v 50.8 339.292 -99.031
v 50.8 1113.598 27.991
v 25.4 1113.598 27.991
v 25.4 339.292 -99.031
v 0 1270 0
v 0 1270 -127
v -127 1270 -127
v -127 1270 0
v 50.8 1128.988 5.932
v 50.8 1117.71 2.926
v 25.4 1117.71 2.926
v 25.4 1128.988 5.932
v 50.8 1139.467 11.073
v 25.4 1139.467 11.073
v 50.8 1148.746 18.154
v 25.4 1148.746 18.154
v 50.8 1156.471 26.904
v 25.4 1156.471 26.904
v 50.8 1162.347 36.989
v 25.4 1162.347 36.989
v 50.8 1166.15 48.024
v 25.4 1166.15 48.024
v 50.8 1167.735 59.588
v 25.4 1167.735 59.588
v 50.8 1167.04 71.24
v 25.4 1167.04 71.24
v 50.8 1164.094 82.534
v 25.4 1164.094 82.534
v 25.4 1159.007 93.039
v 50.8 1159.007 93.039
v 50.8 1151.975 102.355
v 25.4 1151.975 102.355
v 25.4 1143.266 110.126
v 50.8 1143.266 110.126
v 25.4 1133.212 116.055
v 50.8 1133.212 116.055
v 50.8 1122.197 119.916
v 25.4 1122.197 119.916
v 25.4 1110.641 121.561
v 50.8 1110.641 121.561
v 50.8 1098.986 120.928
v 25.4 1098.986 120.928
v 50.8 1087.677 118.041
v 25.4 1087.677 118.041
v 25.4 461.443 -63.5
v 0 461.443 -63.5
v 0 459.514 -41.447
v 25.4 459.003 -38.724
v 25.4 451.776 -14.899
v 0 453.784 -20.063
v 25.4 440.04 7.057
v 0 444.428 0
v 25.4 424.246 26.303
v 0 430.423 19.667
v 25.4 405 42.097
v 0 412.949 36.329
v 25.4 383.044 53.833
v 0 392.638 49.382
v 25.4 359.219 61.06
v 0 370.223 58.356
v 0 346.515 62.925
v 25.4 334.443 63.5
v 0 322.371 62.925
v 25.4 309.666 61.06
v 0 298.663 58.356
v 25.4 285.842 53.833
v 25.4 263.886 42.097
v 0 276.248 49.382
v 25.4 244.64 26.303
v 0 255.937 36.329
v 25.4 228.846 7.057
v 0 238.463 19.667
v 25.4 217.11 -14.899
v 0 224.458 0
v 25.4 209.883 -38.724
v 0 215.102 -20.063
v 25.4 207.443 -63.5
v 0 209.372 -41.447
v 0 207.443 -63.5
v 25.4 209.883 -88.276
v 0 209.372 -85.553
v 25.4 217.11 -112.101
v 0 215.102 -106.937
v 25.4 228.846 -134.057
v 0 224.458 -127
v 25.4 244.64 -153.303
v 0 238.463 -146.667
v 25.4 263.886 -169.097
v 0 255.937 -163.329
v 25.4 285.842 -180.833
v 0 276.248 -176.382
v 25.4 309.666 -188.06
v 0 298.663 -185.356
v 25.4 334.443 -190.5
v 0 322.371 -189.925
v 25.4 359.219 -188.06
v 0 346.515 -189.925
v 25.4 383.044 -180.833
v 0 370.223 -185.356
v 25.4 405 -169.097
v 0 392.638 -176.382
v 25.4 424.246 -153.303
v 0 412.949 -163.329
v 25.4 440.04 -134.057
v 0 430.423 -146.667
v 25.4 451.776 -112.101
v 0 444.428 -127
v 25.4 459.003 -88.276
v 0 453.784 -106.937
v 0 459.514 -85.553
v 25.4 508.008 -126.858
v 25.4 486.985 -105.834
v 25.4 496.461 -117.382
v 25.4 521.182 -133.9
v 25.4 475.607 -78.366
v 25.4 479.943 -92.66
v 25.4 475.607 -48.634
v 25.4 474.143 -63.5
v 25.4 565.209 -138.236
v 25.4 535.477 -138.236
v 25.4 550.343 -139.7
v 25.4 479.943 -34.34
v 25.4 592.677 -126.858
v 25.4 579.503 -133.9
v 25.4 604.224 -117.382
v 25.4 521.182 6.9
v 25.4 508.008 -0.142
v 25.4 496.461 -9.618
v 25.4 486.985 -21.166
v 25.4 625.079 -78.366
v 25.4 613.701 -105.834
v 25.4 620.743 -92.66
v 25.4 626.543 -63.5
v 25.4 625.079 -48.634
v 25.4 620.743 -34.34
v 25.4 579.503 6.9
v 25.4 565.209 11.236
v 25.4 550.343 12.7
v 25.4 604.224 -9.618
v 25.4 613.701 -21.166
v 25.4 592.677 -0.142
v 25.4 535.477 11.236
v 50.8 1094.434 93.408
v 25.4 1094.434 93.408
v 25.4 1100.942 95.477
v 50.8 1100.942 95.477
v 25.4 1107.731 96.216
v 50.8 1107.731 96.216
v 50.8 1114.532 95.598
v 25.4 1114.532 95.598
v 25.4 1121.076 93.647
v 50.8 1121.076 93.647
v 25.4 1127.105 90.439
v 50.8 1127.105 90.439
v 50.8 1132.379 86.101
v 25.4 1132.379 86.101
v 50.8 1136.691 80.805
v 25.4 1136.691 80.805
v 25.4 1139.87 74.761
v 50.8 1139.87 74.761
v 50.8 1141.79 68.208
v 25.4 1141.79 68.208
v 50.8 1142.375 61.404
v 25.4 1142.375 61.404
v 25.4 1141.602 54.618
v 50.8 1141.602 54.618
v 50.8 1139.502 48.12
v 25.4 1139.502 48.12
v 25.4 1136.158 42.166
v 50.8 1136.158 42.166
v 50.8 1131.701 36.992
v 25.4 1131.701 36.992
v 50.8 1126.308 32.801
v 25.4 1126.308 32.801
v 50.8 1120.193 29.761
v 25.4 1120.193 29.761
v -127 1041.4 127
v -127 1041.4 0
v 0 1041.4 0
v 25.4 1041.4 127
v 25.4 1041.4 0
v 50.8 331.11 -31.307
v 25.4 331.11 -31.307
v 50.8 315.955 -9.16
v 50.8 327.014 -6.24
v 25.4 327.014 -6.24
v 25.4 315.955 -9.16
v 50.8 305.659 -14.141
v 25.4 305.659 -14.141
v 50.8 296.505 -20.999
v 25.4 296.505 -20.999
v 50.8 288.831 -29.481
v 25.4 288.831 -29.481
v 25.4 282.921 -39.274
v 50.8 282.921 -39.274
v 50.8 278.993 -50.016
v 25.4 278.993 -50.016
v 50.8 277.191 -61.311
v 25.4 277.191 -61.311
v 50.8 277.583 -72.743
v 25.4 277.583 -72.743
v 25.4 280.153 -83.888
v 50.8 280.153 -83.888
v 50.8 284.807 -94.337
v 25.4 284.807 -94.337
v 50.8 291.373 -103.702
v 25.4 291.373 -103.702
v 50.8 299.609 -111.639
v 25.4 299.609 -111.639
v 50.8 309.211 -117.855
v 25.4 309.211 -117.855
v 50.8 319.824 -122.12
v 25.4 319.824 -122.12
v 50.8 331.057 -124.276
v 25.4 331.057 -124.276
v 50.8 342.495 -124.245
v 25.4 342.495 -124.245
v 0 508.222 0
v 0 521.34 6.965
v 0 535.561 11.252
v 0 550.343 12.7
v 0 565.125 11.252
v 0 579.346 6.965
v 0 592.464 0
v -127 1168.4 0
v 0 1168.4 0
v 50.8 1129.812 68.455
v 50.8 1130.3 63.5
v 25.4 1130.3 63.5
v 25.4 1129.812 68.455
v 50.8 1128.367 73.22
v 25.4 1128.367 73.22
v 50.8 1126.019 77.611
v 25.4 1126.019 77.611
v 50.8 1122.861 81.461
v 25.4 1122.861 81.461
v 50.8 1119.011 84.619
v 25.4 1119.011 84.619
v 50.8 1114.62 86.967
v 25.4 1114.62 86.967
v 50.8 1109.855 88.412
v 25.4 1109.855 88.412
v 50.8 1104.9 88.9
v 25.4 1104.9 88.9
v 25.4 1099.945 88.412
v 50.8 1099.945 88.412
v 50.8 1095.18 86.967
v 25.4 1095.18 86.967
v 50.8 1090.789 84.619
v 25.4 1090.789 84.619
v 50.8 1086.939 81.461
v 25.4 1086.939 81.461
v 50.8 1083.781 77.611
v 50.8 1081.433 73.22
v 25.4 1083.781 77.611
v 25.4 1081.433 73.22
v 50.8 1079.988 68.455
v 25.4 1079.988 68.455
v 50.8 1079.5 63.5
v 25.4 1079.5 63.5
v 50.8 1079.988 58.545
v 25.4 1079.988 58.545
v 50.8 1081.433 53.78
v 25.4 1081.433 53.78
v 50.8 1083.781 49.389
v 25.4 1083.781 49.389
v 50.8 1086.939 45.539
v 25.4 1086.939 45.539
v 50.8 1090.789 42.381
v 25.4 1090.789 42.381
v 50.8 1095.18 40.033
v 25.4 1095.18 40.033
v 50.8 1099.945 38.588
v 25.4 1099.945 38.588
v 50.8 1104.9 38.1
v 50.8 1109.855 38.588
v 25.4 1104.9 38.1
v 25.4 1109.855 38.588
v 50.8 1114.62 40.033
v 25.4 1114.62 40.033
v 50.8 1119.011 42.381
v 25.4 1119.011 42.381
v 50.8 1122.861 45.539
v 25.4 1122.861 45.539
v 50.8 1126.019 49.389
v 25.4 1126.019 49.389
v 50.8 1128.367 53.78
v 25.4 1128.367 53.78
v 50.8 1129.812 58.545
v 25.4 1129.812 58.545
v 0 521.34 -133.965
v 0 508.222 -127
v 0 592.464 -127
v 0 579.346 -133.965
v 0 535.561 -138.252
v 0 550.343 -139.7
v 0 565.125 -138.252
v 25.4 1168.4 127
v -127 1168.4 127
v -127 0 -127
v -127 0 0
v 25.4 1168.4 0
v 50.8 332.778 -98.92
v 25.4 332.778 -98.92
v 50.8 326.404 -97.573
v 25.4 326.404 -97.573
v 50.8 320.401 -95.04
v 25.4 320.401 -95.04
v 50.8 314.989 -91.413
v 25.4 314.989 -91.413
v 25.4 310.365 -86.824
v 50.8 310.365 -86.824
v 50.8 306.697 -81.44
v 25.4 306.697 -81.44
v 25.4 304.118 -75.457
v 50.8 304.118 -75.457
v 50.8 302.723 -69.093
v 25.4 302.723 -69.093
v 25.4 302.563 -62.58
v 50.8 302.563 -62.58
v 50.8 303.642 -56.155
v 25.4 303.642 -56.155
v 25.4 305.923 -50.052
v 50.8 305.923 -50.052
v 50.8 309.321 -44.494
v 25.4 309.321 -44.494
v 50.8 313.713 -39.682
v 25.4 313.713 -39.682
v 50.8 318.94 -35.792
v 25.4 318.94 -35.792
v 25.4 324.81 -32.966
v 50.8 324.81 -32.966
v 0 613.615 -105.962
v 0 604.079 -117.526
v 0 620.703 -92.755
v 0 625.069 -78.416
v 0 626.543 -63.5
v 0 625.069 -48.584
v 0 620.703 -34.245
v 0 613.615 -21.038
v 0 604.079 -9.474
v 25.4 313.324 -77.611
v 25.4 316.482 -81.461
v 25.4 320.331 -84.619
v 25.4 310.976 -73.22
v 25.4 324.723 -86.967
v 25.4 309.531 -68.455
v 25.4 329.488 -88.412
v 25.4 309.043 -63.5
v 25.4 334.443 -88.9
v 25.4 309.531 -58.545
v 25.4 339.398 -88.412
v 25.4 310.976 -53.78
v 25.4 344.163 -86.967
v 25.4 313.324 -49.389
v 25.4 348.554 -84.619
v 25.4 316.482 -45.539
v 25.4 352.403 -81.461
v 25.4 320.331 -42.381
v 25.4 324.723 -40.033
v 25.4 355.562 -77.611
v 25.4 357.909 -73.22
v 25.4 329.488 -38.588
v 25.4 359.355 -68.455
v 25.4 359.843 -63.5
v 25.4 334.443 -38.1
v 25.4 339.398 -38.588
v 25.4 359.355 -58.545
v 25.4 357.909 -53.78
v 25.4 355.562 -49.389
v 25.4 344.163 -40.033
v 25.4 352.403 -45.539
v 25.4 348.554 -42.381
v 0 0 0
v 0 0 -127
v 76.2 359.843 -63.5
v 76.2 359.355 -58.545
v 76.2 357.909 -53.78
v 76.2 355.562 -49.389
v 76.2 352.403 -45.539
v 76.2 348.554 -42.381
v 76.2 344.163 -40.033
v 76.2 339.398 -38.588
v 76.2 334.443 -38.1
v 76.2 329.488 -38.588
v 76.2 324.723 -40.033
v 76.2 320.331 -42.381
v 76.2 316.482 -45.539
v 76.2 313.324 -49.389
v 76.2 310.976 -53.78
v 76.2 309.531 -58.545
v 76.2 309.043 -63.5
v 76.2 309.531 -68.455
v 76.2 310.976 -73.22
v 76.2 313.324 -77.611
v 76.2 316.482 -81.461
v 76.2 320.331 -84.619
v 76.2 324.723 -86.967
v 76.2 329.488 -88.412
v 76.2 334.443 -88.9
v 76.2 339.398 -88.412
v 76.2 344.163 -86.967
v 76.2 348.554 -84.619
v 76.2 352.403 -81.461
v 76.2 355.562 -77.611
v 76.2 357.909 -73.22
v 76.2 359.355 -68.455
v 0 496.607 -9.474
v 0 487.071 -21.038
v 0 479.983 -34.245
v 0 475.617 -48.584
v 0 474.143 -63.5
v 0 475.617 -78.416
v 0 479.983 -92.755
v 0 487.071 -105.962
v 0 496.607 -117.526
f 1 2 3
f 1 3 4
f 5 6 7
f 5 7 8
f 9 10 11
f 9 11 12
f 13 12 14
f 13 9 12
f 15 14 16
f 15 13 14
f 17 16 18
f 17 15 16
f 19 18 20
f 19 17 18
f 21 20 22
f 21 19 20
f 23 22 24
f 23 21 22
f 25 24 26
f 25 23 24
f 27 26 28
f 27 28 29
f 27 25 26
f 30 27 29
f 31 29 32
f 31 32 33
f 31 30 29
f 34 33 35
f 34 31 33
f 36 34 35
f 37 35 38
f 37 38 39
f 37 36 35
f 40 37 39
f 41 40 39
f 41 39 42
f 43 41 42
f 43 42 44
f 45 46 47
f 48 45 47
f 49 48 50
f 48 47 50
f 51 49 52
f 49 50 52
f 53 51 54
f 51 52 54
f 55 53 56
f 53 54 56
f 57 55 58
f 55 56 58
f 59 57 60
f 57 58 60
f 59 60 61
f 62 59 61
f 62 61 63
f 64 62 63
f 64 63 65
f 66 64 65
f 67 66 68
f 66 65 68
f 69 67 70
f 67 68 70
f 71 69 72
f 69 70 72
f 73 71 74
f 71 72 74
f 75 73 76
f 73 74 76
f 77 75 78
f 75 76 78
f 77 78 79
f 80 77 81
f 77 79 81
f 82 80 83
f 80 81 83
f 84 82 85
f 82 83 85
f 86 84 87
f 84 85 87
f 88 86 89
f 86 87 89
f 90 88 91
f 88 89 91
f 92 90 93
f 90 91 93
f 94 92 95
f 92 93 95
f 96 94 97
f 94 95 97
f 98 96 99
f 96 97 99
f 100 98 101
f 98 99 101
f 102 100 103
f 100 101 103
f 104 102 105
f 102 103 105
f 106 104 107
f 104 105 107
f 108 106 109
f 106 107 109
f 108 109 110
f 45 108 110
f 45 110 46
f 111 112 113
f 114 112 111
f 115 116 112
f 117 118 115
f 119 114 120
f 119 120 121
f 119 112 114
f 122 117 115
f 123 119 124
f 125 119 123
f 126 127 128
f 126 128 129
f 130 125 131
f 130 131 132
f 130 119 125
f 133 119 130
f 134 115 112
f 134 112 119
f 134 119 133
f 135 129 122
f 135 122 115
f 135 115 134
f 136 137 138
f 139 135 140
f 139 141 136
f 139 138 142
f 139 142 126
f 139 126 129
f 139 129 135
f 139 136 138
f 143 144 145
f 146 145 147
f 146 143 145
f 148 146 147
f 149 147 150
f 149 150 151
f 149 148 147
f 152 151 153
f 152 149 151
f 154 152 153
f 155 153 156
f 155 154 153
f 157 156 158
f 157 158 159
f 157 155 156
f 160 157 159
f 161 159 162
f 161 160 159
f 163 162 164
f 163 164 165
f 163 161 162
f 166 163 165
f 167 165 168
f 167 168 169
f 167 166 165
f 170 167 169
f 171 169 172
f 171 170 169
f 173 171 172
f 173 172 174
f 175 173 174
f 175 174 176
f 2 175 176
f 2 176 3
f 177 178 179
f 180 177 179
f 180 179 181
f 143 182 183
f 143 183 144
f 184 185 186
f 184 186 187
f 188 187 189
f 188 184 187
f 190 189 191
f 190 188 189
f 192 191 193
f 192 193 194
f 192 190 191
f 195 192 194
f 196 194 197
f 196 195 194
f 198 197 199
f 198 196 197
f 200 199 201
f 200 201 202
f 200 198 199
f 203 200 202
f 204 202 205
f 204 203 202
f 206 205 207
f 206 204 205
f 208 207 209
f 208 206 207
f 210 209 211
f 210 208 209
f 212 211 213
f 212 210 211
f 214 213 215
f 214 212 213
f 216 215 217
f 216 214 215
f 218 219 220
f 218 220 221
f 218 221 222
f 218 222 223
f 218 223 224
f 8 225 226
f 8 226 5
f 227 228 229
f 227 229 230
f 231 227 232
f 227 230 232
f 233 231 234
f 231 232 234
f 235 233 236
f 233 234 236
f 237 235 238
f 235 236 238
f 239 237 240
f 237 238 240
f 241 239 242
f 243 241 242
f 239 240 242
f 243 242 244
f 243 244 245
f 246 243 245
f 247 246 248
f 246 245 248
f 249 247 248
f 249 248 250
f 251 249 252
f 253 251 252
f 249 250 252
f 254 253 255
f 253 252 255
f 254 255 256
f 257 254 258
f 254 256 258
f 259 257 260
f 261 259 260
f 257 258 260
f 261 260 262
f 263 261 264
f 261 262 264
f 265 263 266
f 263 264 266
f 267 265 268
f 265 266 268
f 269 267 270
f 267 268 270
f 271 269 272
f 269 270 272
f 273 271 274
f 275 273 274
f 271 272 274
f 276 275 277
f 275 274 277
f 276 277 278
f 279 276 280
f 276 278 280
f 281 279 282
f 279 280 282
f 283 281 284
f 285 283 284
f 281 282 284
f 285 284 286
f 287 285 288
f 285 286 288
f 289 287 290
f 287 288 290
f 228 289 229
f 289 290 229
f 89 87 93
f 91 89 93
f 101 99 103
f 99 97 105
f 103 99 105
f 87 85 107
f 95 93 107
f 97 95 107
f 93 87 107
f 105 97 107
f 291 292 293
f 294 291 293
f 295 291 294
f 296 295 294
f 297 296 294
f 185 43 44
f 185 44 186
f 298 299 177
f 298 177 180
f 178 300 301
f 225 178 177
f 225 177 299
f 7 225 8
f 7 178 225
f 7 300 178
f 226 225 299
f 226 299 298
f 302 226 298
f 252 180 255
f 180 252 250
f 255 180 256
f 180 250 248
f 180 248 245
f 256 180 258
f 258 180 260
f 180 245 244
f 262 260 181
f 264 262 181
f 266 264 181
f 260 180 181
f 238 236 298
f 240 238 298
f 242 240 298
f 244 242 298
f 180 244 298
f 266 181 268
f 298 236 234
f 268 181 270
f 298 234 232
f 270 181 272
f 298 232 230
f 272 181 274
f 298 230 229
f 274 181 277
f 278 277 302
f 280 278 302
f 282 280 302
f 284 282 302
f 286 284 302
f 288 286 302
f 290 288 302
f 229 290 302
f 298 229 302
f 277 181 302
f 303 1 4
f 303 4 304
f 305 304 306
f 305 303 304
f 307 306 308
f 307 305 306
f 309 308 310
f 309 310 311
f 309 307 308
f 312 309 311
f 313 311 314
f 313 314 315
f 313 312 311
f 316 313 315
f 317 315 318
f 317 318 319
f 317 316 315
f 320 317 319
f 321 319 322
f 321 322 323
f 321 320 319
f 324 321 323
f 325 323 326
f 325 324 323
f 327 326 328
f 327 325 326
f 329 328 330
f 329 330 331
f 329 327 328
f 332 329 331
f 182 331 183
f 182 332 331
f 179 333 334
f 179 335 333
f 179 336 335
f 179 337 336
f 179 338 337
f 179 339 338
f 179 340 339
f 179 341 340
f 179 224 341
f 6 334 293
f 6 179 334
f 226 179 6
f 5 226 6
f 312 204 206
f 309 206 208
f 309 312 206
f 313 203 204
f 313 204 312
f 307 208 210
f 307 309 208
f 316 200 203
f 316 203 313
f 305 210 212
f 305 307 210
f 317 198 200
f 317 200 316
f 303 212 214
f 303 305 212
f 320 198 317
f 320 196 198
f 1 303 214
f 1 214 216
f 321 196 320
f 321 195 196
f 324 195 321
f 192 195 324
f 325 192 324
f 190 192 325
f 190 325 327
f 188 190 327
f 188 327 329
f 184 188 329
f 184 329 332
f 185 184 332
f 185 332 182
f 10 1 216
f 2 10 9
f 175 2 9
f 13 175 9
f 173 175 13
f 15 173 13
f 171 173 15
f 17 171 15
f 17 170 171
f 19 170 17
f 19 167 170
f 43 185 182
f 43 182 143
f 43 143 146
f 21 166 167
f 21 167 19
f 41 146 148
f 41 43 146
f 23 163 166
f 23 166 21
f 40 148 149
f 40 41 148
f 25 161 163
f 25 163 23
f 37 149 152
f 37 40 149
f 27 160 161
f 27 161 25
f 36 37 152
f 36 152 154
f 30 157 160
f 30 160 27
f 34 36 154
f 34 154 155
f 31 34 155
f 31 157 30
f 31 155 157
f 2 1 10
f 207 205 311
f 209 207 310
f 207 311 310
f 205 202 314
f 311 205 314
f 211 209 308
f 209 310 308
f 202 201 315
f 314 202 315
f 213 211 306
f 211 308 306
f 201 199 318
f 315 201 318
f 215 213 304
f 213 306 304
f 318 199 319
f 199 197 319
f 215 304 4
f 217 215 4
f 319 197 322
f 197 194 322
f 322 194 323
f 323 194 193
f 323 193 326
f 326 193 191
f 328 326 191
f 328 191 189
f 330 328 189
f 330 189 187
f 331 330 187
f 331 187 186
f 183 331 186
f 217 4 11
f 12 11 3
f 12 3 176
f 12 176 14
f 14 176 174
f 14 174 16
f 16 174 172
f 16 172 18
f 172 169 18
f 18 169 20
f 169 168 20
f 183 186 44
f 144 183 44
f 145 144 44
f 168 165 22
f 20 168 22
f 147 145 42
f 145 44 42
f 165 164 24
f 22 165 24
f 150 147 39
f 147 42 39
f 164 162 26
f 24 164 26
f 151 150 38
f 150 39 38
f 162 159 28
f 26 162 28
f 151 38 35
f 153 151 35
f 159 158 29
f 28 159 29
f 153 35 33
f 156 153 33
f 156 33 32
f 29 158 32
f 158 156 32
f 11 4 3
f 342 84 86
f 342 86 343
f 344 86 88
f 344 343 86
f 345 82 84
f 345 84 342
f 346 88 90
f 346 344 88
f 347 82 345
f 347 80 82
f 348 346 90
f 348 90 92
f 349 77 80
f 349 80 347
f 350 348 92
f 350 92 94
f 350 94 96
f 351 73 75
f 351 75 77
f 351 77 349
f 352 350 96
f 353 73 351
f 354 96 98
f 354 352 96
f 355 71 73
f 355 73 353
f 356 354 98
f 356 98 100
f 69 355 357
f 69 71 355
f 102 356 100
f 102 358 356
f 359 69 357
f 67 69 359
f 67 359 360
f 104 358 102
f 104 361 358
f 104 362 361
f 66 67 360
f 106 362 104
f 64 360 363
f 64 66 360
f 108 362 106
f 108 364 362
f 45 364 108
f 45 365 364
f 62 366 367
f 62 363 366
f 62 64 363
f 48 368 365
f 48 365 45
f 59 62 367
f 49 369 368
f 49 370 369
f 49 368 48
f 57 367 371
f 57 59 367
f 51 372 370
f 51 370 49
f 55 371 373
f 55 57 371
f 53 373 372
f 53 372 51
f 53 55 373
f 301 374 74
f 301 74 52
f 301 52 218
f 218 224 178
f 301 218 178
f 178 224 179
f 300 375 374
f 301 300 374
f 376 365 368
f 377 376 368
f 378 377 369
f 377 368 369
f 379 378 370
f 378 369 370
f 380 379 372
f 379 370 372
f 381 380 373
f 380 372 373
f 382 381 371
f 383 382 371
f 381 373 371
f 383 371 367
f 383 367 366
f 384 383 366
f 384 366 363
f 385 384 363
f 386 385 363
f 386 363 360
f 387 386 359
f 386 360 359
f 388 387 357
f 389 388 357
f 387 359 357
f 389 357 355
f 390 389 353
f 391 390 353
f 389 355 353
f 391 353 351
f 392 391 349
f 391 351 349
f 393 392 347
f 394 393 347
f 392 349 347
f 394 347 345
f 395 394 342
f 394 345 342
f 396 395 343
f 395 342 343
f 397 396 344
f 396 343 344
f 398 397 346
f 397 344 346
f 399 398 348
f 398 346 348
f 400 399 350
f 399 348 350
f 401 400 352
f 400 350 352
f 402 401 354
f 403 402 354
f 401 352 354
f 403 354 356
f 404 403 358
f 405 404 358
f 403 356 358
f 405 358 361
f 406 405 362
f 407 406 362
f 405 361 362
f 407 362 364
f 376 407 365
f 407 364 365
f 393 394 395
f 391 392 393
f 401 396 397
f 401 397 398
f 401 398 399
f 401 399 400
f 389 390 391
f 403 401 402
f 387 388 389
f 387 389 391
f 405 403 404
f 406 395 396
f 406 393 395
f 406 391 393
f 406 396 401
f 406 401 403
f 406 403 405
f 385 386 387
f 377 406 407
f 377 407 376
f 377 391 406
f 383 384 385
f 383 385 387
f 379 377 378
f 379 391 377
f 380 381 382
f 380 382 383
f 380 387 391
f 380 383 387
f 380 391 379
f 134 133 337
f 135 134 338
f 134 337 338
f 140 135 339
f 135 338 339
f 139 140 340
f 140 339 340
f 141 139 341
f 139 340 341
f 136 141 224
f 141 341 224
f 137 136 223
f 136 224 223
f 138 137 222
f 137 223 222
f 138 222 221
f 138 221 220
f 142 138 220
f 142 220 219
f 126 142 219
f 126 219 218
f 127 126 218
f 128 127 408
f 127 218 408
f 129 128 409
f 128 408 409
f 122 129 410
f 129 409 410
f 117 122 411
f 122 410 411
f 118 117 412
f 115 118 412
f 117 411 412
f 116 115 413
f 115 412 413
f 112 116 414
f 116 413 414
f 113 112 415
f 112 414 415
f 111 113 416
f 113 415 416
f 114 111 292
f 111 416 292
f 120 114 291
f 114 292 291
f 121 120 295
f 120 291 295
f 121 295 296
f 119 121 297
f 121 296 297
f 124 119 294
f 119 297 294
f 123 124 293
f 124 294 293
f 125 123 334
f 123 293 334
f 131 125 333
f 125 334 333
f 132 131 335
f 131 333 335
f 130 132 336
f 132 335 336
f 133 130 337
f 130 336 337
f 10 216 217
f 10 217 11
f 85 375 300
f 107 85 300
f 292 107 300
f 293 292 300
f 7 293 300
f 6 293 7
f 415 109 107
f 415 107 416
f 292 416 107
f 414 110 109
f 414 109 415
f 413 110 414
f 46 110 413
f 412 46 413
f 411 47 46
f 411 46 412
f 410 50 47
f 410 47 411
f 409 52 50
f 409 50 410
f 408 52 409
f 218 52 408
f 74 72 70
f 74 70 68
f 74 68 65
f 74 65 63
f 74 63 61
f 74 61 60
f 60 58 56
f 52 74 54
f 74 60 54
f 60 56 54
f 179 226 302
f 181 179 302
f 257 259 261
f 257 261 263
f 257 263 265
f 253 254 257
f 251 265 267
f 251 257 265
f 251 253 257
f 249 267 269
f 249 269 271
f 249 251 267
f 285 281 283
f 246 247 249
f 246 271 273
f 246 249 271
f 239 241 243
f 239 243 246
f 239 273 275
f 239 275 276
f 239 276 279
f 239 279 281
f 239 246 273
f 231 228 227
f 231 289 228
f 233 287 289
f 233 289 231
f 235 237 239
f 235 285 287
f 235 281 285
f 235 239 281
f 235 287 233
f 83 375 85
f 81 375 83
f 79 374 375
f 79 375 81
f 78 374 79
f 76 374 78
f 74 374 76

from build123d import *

# Parameters (mm, degrees)
F0_W      = 1270
F0_H      = 127
F1_DEPTH  = 127
F2_R      = 127
F2_R_2    = 76.2
F3_DEPTH  = 25.4
F4_R      = 25.4
F5_DEPTH  = 50.8
F6_W      = 152.4
F6_H      = 127
F7_DEPTH  = 127
F8_R      = 25.4
F9_DEPTH  = 25.4
F11_DEPTH = 25.4


with BuildPart() as f1:
    # F0 (on Right) → F1 (new body)
    with BuildSketch(Plane.YZ):
        with Locations((635, -63.5)):
            Rectangle(F0_W, F0_H)
    extrude(amount=-F1_DEPTH)

    # F2 (on face) → F3 (join)
    with BuildSketch(Plane.YZ):
        with Locations((334.442943, -63.5)):
            Circle(F2_R)
        with Locations((550.342943, -63.5)):
            Circle(F2_R_2)
    extrude(amount=F3_DEPTH)

    # F4 (on face) → F5 (join)
    with BuildSketch(Plane.YZ.offset(25.4)):
        with Locations((334.442943, -63.5)):
            Circle(F4_R)
    extrude(amount=F5_DEPTH)

    # F6 (on face) → F7 (join)
    with BuildSketch(Plane.XY):
        with Locations((-50.8, 1104.9)):
            Rectangle(F6_W, F6_H)
    extrude(amount=F7_DEPTH)

    # F8 (on face) → F9 (join)
    with BuildSketch(Plane.YZ.offset(25.4)):
        with Locations((1104.9, 63.5)):
            Circle(F8_R)
    extrude(amount=F9_DEPTH)


with BuildPart() as f11:
    # F10 (on face) → F11 (new body)
    with BuildSketch(Plane.YZ.offset(50.8)):
        with BuildLine():
            Line((342.495281, -124.245123), (1117.709524, 2.926132))
            ThreePointArc((1117.709524, 2.926132), (1165.843593, 76.959006), (1087.676723, 118.040576))
            Line((1087.676723, 118.040576), (327.014414, -6.239587))
            ThreePointArc((327.014414, -6.239587), (277.582596, -72.742647), (342.495281, -124.245123))
        make_face()
        with BuildLine():
            Line((331.11006, -31.307172), (1094.433681, 93.407807))
            ThreePointArc((1094.433681, 93.407807), (1140.993518, 71.532201), (1113.597707, 27.991069))
            Line((1113.597707, 27.991069), (339.292049, -99.031135))
            ThreePointArc((339.292049, -99.031135), (302.723192, -69.092928), (331.11006, -31.307172))
        make_face(mode=Mode.SUBTRACT)
    extrude(amount=-F11_DEPTH)


solid = Compound([f1.part, f11.part])
